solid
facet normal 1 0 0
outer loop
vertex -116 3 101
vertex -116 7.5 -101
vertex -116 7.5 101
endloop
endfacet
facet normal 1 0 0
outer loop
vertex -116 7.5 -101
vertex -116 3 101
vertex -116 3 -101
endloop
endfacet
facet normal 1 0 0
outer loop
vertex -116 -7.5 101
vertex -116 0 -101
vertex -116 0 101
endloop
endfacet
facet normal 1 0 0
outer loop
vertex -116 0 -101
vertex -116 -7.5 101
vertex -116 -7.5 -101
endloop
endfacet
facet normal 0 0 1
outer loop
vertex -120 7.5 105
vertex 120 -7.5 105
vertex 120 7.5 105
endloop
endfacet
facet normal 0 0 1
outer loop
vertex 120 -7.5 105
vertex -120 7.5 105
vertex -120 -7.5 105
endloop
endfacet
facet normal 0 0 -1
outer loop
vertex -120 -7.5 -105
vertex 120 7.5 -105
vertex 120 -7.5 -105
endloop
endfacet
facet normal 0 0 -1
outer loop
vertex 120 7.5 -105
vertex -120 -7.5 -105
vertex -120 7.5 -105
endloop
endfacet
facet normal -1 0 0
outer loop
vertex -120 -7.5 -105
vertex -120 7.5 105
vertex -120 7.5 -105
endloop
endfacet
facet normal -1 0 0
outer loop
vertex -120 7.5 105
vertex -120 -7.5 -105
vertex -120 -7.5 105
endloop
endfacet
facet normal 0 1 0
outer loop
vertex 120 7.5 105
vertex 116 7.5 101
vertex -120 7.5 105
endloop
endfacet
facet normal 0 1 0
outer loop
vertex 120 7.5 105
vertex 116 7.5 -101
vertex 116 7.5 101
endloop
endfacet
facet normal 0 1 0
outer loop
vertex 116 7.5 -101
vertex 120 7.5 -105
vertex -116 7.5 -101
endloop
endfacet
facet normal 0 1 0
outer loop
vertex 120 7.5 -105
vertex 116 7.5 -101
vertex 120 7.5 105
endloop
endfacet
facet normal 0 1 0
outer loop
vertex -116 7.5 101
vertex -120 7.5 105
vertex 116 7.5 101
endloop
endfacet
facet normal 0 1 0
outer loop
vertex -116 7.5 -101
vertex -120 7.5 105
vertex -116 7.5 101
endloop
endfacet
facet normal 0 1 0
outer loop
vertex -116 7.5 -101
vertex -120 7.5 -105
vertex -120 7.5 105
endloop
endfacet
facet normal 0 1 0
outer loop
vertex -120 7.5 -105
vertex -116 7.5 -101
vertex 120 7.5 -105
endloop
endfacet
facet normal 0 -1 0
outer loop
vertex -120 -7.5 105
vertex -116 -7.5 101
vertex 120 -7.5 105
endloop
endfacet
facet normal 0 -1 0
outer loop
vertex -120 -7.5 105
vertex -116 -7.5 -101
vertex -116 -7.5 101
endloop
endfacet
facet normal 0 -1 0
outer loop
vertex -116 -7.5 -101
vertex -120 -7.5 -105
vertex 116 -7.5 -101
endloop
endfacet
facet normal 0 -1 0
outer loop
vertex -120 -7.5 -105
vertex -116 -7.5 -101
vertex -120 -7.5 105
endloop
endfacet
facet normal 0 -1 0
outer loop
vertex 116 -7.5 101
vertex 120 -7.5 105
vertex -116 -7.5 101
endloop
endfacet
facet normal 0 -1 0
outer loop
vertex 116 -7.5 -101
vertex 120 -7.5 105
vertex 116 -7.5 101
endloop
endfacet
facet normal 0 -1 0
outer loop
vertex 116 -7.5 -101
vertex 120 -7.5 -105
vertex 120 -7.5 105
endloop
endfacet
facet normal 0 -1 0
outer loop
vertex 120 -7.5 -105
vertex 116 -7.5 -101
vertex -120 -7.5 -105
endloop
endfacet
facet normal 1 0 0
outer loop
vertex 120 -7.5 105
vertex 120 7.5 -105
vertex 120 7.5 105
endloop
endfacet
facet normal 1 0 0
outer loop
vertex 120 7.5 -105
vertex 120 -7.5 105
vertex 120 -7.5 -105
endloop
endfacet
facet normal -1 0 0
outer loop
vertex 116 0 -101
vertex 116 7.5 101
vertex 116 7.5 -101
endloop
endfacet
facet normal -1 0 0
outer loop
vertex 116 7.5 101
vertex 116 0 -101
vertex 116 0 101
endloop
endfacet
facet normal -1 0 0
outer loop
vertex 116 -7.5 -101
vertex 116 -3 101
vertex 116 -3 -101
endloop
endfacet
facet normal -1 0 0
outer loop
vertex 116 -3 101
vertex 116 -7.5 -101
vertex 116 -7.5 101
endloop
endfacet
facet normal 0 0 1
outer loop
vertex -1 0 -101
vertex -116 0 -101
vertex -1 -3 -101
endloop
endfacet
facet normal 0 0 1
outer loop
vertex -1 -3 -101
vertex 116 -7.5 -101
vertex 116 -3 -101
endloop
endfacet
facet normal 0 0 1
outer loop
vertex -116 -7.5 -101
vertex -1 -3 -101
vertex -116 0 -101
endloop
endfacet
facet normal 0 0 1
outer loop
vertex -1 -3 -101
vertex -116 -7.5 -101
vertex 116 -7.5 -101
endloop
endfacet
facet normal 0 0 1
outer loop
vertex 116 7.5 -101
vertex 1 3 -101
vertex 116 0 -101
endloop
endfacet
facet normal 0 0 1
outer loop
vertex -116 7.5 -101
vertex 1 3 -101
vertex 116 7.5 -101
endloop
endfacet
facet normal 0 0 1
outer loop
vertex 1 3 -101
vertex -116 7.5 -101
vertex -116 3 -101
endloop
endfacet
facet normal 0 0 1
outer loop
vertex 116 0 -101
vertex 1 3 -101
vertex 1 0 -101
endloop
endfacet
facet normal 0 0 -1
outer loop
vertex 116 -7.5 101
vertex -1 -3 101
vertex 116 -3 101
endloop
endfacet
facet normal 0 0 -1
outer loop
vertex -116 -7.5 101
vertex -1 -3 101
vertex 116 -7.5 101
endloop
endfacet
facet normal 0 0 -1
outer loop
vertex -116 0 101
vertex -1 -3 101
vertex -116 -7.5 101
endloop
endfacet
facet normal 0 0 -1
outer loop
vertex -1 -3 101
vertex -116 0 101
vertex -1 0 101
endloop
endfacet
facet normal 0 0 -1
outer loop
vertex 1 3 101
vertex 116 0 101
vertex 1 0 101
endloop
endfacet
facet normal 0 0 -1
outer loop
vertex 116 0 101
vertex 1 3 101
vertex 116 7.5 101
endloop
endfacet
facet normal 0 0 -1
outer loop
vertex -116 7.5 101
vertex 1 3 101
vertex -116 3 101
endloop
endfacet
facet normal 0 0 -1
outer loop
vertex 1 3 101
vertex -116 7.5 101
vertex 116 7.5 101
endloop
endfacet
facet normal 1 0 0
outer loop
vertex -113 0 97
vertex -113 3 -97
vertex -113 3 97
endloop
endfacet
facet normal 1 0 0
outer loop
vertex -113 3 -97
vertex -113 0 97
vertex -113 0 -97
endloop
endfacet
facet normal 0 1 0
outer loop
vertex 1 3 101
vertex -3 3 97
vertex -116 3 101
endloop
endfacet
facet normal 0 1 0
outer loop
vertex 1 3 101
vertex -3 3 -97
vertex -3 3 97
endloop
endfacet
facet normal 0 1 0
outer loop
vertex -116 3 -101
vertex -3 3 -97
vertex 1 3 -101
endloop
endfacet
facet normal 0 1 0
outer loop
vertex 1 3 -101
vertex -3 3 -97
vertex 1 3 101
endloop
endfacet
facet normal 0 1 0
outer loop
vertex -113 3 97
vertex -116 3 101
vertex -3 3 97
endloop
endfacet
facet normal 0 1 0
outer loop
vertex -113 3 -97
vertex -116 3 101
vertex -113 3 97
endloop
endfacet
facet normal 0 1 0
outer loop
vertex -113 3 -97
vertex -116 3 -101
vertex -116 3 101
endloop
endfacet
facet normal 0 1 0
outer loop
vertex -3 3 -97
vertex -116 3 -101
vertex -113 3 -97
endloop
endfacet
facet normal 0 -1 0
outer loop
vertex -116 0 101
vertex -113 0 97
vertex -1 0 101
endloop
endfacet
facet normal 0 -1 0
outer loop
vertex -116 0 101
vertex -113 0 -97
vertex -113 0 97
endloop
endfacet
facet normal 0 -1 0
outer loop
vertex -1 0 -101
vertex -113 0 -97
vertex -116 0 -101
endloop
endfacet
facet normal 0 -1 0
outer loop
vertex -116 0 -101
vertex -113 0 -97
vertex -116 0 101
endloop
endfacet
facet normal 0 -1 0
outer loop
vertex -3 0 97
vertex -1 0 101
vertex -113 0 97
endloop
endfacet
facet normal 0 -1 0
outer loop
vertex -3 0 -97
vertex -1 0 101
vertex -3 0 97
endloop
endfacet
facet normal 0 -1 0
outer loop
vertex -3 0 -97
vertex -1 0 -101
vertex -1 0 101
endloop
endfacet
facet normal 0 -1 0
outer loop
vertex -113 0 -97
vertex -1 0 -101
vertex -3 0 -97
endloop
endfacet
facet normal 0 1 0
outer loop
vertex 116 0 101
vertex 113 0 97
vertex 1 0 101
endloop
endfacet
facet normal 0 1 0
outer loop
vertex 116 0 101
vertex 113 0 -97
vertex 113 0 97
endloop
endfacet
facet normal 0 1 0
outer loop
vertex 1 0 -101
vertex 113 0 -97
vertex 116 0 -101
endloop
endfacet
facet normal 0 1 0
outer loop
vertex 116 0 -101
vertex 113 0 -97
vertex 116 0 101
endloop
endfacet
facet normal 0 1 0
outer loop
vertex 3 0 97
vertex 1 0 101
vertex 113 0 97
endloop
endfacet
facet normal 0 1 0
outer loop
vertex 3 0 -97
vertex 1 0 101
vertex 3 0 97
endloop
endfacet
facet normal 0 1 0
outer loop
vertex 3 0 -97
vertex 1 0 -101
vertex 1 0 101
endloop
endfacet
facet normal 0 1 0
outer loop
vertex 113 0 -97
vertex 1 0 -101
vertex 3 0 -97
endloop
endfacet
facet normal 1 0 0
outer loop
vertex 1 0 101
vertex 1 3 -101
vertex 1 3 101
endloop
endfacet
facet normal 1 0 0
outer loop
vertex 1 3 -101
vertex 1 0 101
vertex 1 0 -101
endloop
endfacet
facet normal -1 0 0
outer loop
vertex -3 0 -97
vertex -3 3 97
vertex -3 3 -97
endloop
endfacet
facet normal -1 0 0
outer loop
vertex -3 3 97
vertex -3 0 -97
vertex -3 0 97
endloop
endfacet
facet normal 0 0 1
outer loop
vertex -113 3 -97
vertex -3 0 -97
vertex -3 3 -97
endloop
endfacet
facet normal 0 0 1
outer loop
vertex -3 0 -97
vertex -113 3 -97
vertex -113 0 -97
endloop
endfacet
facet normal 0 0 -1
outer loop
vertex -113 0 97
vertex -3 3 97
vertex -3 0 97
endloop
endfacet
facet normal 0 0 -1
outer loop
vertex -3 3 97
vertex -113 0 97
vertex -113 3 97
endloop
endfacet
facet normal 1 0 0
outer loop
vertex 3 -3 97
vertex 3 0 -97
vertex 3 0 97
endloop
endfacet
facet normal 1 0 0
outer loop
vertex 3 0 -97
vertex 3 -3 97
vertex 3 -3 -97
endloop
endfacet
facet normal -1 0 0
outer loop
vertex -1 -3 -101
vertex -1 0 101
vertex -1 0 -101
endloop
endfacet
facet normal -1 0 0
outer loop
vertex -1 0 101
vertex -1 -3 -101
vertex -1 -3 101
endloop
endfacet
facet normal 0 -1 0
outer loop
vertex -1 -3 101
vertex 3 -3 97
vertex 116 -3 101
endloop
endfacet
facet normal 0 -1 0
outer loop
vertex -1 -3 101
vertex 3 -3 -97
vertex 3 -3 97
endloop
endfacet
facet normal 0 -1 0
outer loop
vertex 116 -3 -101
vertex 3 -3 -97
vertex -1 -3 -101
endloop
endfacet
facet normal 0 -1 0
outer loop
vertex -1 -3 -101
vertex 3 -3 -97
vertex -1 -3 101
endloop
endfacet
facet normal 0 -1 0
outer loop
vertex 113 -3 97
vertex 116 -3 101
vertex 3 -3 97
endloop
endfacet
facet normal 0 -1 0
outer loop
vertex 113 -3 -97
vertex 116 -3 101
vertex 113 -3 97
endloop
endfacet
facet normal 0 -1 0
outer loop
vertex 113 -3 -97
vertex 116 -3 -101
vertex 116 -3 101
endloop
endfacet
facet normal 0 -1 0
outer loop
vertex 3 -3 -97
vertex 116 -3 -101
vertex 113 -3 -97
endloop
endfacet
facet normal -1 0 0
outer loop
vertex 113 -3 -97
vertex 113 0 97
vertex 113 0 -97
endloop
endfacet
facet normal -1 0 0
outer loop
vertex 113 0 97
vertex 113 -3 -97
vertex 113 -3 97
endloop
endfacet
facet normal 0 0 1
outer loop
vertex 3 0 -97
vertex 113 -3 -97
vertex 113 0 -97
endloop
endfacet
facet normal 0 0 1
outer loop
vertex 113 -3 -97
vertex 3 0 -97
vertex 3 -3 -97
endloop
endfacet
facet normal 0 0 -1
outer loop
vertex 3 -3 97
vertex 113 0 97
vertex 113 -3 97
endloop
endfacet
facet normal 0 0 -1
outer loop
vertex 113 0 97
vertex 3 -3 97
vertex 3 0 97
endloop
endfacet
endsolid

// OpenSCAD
module slidingdoor(width=240, height=210, wall_thickness=15) 
{
    door_thickness = 4.0;
    profile_width = 4;
    profile_depth = 3.0;
    frame_profile_width = 4;
    frame_profile_depth = wall_thickness;
    
    //translate([0, 
    //    -(frame_profile_depth-door_thickness)/2, height/2])
    union() {
             
        /* Outer frame fixed to concrete wall. */
        color([0.2,0.0,0.1])
        genericdoorframe(width, height, frame_profile_width, frame_profile_depth);
    
        /* Calculate opning size. */
        open_w = width - 2 * frame_profile_width;
        open_h = height - 2 * frame_profile_width;
        half_open_w = (open_w + frame_profile_width)/2; 
        
        /* Left window glass frame. */
        translate([-(open_w)/4, profile_depth/2, 0]) 
        color([0.5,0.3,0.3])
        genericdoorframe(half_open_w, open_h, profile_width, profile_depth);
    
        /* Right window glass frame. */
        translate([(open_w)/4, -profile_depth/2, 0]) 
        color([0.5,0.3,0.3])
        genericdoorframe(half_open_w, open_h, profile_width, profile_depth);
    }
}

module genericdoorframe(width=70, height=110, profile_width = 5, profile_depth = 8) 
{
    translate([-(width - profile_width)/2, 0, 0]) 
    cube([profile_width,profile_depth, height], center=true);
    
    translate([(width - profile_width)/2, 0, 0]) 
    cube([profile_width,profile_depth, height], center=true);

    translate([0, 0, -(height - profile_width)/2]) 
    cube([width, profile_depth, profile_width], center=true);

    translate([0, 0, (height - profile_width)/2]) 
    cube([width, profile_depth, profile_width], center=true);
}    

/* For testing */
slidingdoor();
